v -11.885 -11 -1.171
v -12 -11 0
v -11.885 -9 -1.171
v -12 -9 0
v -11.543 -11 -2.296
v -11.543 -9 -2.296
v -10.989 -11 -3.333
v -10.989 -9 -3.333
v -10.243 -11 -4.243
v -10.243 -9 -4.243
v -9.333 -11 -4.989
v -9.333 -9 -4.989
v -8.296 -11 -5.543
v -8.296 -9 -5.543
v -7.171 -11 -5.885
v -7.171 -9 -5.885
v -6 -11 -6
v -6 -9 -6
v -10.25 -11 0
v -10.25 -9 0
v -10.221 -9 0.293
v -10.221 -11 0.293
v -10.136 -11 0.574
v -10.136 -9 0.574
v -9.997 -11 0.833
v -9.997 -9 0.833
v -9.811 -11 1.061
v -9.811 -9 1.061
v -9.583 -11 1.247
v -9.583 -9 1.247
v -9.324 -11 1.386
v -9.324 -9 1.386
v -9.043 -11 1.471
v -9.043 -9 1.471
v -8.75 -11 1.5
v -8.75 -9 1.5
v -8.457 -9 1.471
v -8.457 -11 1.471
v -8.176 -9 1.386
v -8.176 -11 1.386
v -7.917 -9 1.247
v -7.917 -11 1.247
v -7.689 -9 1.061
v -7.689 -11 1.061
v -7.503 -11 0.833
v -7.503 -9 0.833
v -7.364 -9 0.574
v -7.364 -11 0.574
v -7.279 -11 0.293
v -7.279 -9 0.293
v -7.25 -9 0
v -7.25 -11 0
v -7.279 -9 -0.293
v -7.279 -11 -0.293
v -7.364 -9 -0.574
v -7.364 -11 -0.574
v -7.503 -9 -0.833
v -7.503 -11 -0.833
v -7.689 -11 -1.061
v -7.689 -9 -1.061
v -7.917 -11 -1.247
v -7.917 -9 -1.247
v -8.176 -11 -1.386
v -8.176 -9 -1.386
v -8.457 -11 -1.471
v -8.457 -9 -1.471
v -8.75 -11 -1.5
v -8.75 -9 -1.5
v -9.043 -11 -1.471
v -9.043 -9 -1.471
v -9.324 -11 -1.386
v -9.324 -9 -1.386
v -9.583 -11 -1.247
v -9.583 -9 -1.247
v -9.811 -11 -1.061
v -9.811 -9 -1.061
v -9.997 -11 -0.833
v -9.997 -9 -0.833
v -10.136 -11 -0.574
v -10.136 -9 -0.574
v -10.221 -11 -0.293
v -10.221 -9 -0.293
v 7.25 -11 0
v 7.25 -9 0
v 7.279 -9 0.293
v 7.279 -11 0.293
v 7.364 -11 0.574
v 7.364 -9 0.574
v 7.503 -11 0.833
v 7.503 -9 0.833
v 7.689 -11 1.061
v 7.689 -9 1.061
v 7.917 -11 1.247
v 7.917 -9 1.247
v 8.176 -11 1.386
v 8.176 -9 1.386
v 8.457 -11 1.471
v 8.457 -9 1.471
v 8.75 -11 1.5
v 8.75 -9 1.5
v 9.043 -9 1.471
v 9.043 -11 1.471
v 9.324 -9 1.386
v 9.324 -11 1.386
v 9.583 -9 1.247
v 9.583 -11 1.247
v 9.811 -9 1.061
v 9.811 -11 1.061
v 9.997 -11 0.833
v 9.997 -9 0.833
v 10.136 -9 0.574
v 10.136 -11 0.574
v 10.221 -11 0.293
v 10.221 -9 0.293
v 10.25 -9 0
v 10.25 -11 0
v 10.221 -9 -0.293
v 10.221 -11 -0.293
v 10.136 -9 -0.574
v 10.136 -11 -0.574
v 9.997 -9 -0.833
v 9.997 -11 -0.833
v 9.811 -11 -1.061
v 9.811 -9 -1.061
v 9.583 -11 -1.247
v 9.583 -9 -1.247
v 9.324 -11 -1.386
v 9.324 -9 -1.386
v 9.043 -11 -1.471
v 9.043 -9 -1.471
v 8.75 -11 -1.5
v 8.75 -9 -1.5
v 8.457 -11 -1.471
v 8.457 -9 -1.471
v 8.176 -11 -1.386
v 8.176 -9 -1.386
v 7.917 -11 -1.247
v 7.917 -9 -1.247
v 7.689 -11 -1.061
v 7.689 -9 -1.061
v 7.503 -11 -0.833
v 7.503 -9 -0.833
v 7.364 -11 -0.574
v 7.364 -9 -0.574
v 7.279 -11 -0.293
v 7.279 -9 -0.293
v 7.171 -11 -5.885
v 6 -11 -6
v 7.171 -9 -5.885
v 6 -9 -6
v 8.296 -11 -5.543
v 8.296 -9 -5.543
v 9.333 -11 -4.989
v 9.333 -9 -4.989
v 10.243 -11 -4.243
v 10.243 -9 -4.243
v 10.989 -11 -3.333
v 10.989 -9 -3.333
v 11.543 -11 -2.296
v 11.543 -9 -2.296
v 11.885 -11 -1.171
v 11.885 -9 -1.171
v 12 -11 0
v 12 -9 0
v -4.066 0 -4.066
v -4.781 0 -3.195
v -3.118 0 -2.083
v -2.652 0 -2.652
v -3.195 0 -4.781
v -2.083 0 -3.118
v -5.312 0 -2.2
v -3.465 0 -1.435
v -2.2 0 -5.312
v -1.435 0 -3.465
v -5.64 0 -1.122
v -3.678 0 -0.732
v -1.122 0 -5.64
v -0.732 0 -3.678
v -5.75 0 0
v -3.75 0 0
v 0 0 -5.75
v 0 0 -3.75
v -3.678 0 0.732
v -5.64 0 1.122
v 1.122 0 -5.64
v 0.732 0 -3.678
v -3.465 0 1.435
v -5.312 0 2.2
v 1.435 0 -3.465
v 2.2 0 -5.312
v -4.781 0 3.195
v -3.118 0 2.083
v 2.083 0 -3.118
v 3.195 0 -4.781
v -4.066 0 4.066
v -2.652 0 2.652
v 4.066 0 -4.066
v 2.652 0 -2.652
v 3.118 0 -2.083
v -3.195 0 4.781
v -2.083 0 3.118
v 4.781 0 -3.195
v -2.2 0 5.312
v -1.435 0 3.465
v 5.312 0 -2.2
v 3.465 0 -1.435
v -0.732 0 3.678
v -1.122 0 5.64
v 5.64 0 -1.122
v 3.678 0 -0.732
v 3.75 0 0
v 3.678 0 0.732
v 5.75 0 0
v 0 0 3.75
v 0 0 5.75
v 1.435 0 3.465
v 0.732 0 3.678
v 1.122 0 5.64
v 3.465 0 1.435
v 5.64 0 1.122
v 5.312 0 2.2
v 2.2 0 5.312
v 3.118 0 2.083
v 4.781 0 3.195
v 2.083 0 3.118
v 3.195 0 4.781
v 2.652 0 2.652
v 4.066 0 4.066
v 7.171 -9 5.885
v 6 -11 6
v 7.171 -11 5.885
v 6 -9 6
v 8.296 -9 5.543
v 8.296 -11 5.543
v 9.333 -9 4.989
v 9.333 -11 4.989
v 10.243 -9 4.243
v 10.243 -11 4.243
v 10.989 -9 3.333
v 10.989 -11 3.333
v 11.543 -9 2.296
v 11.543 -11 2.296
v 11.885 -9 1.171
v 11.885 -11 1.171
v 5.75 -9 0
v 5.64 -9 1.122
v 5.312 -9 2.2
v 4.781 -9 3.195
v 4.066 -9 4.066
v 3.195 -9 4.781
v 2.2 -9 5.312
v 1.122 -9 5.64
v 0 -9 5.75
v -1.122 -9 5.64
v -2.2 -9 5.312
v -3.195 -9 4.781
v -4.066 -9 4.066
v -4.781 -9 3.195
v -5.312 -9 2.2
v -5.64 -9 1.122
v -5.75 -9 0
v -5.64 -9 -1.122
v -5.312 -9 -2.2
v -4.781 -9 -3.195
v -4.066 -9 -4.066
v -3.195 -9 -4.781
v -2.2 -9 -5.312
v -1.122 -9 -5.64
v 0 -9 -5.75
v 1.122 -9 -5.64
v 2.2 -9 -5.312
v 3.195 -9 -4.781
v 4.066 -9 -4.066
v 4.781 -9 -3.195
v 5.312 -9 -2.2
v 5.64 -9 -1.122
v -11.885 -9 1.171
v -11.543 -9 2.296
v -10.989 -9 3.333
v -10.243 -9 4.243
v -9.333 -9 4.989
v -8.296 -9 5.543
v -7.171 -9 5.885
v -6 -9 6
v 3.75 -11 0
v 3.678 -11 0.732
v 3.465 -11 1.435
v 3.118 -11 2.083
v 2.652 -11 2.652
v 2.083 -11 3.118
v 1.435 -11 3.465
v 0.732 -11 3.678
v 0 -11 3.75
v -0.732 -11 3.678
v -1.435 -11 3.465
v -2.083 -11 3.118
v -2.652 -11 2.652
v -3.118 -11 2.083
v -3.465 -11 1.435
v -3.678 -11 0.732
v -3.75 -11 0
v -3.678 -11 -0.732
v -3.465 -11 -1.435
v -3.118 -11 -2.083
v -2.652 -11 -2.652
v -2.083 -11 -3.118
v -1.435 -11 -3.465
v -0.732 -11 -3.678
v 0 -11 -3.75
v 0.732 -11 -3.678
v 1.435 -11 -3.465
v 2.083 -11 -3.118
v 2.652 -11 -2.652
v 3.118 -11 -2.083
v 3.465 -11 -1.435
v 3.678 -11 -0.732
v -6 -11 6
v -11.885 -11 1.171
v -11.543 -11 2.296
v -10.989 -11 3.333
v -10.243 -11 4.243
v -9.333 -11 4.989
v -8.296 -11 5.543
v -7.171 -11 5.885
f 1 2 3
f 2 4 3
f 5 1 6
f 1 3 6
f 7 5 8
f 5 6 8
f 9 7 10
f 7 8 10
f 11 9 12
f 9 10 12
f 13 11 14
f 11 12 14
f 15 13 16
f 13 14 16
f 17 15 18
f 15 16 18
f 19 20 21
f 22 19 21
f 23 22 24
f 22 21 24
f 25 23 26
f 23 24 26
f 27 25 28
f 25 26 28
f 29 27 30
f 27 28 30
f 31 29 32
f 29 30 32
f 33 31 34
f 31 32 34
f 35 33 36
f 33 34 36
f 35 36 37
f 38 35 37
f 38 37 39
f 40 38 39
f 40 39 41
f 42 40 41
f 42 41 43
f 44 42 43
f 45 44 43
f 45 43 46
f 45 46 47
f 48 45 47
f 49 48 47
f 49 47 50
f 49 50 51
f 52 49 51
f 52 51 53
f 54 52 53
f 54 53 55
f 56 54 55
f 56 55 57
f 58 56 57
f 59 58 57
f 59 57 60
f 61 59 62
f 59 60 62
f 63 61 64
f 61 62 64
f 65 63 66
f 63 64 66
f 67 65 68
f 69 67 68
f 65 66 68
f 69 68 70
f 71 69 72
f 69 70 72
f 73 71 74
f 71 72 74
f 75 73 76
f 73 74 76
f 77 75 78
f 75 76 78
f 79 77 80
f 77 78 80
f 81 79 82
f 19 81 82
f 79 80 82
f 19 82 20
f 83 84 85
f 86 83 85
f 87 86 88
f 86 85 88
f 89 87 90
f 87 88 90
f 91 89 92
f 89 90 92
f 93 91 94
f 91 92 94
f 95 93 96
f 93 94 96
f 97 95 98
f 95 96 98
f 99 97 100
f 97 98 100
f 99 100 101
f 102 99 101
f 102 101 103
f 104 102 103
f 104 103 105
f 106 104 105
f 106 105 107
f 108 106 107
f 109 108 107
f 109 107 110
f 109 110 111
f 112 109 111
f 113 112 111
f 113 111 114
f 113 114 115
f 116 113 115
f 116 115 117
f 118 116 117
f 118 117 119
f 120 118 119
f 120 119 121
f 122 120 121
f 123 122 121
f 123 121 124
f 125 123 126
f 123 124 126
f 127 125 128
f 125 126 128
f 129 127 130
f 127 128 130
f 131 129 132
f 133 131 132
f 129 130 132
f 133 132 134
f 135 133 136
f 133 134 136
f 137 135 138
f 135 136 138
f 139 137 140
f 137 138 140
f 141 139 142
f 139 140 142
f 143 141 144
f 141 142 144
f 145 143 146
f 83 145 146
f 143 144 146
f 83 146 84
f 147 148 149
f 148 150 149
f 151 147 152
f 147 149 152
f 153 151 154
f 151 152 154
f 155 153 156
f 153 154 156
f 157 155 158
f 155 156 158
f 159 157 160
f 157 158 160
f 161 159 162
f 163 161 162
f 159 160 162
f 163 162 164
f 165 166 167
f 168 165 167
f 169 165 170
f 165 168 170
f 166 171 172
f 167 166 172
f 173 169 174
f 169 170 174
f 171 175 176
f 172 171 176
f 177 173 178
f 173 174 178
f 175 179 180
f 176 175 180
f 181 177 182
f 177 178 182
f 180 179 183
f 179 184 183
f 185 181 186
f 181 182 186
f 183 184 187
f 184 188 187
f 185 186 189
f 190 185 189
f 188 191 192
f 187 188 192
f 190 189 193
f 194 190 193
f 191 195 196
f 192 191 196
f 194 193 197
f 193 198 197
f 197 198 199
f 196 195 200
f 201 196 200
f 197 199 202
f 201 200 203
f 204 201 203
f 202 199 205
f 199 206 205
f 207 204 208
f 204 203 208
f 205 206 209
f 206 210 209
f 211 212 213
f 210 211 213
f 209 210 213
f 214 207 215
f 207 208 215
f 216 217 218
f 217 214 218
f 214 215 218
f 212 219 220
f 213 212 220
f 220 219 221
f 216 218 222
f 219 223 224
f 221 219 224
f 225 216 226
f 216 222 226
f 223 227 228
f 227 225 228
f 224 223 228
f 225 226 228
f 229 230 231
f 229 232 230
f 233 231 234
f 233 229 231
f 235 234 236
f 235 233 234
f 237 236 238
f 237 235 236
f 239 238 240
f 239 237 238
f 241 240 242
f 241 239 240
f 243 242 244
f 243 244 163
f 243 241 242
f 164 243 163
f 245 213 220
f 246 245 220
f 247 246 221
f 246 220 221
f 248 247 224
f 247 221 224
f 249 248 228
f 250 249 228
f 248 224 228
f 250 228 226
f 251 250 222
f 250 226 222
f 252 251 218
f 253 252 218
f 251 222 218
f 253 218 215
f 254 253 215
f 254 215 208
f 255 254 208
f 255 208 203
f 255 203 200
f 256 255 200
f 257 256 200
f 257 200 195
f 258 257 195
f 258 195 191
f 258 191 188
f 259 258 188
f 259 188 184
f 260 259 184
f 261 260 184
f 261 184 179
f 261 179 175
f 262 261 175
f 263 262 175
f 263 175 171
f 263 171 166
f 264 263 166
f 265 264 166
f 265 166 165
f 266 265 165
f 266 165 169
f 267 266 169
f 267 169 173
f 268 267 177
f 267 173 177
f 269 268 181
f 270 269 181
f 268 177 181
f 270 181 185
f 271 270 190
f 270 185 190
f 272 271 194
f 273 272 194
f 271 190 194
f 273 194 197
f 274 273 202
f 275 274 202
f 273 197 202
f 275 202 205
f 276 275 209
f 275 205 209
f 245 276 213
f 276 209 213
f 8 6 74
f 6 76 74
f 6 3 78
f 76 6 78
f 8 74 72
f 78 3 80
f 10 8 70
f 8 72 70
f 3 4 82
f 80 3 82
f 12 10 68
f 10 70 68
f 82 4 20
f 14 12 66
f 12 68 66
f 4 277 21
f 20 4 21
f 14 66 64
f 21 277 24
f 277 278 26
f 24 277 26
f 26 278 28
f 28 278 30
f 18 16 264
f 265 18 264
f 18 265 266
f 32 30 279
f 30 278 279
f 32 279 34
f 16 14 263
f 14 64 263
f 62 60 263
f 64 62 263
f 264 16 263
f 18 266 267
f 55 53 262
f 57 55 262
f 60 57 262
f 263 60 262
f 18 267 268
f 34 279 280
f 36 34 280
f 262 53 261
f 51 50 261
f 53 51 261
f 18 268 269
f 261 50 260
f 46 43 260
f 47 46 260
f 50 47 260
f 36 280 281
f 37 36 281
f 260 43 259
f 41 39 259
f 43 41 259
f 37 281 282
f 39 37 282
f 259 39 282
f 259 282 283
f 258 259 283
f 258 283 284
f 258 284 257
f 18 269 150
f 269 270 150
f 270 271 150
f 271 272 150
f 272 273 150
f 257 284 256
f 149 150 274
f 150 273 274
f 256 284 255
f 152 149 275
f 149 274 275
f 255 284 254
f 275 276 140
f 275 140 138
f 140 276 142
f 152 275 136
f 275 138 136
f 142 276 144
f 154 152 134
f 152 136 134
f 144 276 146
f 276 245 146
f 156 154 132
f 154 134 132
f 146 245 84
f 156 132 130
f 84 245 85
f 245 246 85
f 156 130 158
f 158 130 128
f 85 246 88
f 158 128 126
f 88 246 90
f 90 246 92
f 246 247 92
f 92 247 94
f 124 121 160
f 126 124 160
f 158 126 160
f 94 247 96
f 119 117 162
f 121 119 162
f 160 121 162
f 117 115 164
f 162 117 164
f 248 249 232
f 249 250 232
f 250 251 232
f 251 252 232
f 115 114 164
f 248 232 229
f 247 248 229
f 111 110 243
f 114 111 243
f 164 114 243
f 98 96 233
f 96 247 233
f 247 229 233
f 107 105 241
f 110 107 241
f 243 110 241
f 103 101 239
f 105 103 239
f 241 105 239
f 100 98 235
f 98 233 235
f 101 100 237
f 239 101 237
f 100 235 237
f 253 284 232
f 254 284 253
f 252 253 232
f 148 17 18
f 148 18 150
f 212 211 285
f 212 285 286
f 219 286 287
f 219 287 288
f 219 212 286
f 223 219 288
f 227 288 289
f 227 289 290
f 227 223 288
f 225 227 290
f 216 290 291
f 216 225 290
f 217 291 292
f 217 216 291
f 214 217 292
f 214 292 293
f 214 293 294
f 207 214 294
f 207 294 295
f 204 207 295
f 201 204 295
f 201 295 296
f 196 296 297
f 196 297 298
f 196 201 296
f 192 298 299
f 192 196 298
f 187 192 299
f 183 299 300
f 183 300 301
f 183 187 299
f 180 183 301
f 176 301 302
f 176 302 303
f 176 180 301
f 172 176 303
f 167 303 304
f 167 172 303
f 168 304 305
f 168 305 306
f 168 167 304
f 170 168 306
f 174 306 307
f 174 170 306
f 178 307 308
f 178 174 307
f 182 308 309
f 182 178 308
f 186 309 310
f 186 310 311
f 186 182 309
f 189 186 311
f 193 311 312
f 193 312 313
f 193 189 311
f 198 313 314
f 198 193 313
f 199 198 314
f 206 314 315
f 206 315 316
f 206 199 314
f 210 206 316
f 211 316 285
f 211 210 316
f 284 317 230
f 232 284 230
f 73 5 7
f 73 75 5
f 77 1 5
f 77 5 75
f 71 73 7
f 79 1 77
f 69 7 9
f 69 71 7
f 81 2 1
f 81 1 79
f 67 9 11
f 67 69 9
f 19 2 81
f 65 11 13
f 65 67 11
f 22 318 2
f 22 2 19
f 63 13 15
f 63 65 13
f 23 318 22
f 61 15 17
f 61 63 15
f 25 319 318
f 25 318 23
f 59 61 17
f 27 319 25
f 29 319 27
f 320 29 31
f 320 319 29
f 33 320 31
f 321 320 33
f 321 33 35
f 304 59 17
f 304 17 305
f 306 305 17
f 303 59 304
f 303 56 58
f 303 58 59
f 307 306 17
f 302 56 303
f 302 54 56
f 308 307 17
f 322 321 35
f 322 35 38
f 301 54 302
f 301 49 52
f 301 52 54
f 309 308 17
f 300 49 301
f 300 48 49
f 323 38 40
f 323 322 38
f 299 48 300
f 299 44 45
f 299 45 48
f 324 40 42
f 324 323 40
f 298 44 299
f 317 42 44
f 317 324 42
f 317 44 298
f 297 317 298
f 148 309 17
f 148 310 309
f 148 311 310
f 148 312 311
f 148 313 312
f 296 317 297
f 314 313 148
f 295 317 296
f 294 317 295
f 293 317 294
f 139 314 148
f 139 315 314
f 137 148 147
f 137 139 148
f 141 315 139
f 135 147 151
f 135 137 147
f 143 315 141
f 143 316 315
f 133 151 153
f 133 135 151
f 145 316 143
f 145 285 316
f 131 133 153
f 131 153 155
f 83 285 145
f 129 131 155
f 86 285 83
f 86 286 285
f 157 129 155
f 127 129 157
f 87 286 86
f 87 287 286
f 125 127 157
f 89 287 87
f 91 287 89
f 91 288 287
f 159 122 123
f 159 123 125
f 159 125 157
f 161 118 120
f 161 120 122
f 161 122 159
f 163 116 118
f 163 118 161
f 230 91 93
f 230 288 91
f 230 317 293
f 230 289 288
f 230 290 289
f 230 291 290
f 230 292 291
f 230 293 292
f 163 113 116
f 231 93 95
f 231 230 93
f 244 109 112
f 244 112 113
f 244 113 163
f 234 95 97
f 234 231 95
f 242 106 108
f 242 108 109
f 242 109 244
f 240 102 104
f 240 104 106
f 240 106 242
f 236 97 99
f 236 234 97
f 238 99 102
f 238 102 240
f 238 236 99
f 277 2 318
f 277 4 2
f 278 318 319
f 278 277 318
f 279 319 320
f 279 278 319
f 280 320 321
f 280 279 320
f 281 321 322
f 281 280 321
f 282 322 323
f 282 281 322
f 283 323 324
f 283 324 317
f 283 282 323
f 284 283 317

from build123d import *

# Parameters (mm, degrees)
F0_R     = 5.75
F0_R_2   = 3.75
F1_DEPTH = 11
F2_W     = 24
F2_H     = 12
F2_R     = 5.75
F3_DEPTH = 2
F4_D     = 3
F5_R     = 5.99999


# Not quite as in the source:
# - a fillet or chamfer is up to 0.001 mm smaller than in the source, because OpenCascade refuses the exact size


with BuildPart() as f1:
    # F0 (on Front) → F1 (new body)
    with BuildSketch(Plane.XZ):
        Circle(F0_R)
        Circle(F0_R_2, mode=Mode.SUBTRACT)
    extrude(amount=F1_DEPTH)

    # F2 (on face) → F3 (join)
    with BuildSketch(Plane.XZ.offset(11)):
        Rectangle(F2_W, F2_H)
        Circle(F2_R, mode=Mode.SUBTRACT)
    extrude(amount=-F3_DEPTH)

    # F4 (through all)
    with Locations(Plane.XZ.offset(11)):
        with Locations((-8.75, 0), (8.75, 0)):
            Hole(F4_D / 2)

    # F5 (radius 6 in the source; OpenCascade refuses exactly that, so slightly less here)
    f5_edges = [f1.edges().sort_by_distance(p)[0] for p in [
        (12, -10, 6),
        (12, -10, -6),
        (-12, -10, 6),
        (-12, -10, -6),
    ]]
    fillet(f5_edges, radius=F5_R)


solid = f1.part
